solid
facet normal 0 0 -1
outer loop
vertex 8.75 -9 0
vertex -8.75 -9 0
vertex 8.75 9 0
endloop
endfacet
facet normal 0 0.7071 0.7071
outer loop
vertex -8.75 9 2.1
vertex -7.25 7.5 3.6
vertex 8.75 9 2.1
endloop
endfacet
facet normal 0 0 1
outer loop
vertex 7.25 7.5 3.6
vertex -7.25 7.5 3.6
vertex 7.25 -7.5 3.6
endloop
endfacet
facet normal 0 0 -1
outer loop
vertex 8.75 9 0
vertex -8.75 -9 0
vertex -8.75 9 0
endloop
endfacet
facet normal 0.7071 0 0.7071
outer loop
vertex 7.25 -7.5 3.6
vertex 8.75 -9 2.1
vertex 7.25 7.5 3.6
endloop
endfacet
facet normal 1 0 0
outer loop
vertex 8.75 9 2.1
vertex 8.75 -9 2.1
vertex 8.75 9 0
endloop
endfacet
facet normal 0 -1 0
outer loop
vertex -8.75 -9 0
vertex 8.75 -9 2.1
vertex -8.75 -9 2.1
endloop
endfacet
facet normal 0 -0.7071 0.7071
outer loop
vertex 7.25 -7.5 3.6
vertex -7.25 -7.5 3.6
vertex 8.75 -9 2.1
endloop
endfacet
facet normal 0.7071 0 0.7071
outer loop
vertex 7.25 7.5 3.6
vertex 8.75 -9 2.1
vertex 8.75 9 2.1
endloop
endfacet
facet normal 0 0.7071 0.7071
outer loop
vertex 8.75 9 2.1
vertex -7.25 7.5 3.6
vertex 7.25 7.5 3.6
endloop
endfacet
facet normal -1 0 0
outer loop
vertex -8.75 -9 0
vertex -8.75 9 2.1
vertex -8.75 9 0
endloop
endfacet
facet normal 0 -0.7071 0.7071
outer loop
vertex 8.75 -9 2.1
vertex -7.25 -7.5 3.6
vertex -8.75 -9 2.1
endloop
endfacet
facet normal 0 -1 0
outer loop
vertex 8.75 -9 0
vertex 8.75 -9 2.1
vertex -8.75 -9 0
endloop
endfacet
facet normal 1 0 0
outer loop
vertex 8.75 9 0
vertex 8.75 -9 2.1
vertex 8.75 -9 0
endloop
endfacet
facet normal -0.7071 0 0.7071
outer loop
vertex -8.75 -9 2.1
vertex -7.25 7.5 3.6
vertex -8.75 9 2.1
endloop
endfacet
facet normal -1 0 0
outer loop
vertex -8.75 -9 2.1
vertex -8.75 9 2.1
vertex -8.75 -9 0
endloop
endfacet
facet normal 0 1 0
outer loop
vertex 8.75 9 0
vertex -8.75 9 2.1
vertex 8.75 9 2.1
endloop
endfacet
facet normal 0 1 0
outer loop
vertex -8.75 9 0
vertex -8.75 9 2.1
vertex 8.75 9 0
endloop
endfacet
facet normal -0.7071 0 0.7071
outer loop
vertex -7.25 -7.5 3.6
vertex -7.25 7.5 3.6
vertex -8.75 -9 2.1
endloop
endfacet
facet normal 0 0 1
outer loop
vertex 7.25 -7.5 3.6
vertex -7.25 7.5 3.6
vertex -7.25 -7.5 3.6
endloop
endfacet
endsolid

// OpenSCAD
module keycap(keycap_width = 17.5, keycap_depth = 18) {
    hull() {
        //keycap base bottom
        translate(v = [0, 0, 0.05]) {
            linear_extrude(center = true, convexity = 0, height = 0.1) {
                polygon(points = [[keycap_width/2, keycap_depth/2], [keycap_width/2, -keycap_depth/2], [-keycap_width/2, -keycap_depth/2], [-keycap_width/2, keycap_depth/2], [keycap_width/2, keycap_depth/2]]);
            }
        }
        //keycap base top
        translate(v = [0, 0, 2.05]) {
            linear_extrude(center = true, convexity = 0, height = 0.1) {
                polygon(points = [[keycap_width/2, keycap_depth/2], [keycap_width/2, -keycap_depth/2], [-keycap_width/2, -keycap_depth/2], [-keycap_width/2, keycap_depth/2], [keycap_width/2, keycap_depth/2]]);
            }
        }
        //keycap top
        translate(v = [0, 0, 3.55]) {
            linear_extrude(center = true, convexity = 0, height = 0.1) {
                polygon(points = [[(keycap_width-3)/2, (keycap_depth-3)/2], [(keycap_width-3)/2, -(keycap_depth-3)/2], [-(keycap_width-3)/2, -(keycap_depth-3)/2], [-(keycap_width-3)/2, (keycap_depth-3)/2], [(keycap_width-3)/2, (keycap_depth-3)/2]]);
            }
        }
     }
 }
 
 keycap();
